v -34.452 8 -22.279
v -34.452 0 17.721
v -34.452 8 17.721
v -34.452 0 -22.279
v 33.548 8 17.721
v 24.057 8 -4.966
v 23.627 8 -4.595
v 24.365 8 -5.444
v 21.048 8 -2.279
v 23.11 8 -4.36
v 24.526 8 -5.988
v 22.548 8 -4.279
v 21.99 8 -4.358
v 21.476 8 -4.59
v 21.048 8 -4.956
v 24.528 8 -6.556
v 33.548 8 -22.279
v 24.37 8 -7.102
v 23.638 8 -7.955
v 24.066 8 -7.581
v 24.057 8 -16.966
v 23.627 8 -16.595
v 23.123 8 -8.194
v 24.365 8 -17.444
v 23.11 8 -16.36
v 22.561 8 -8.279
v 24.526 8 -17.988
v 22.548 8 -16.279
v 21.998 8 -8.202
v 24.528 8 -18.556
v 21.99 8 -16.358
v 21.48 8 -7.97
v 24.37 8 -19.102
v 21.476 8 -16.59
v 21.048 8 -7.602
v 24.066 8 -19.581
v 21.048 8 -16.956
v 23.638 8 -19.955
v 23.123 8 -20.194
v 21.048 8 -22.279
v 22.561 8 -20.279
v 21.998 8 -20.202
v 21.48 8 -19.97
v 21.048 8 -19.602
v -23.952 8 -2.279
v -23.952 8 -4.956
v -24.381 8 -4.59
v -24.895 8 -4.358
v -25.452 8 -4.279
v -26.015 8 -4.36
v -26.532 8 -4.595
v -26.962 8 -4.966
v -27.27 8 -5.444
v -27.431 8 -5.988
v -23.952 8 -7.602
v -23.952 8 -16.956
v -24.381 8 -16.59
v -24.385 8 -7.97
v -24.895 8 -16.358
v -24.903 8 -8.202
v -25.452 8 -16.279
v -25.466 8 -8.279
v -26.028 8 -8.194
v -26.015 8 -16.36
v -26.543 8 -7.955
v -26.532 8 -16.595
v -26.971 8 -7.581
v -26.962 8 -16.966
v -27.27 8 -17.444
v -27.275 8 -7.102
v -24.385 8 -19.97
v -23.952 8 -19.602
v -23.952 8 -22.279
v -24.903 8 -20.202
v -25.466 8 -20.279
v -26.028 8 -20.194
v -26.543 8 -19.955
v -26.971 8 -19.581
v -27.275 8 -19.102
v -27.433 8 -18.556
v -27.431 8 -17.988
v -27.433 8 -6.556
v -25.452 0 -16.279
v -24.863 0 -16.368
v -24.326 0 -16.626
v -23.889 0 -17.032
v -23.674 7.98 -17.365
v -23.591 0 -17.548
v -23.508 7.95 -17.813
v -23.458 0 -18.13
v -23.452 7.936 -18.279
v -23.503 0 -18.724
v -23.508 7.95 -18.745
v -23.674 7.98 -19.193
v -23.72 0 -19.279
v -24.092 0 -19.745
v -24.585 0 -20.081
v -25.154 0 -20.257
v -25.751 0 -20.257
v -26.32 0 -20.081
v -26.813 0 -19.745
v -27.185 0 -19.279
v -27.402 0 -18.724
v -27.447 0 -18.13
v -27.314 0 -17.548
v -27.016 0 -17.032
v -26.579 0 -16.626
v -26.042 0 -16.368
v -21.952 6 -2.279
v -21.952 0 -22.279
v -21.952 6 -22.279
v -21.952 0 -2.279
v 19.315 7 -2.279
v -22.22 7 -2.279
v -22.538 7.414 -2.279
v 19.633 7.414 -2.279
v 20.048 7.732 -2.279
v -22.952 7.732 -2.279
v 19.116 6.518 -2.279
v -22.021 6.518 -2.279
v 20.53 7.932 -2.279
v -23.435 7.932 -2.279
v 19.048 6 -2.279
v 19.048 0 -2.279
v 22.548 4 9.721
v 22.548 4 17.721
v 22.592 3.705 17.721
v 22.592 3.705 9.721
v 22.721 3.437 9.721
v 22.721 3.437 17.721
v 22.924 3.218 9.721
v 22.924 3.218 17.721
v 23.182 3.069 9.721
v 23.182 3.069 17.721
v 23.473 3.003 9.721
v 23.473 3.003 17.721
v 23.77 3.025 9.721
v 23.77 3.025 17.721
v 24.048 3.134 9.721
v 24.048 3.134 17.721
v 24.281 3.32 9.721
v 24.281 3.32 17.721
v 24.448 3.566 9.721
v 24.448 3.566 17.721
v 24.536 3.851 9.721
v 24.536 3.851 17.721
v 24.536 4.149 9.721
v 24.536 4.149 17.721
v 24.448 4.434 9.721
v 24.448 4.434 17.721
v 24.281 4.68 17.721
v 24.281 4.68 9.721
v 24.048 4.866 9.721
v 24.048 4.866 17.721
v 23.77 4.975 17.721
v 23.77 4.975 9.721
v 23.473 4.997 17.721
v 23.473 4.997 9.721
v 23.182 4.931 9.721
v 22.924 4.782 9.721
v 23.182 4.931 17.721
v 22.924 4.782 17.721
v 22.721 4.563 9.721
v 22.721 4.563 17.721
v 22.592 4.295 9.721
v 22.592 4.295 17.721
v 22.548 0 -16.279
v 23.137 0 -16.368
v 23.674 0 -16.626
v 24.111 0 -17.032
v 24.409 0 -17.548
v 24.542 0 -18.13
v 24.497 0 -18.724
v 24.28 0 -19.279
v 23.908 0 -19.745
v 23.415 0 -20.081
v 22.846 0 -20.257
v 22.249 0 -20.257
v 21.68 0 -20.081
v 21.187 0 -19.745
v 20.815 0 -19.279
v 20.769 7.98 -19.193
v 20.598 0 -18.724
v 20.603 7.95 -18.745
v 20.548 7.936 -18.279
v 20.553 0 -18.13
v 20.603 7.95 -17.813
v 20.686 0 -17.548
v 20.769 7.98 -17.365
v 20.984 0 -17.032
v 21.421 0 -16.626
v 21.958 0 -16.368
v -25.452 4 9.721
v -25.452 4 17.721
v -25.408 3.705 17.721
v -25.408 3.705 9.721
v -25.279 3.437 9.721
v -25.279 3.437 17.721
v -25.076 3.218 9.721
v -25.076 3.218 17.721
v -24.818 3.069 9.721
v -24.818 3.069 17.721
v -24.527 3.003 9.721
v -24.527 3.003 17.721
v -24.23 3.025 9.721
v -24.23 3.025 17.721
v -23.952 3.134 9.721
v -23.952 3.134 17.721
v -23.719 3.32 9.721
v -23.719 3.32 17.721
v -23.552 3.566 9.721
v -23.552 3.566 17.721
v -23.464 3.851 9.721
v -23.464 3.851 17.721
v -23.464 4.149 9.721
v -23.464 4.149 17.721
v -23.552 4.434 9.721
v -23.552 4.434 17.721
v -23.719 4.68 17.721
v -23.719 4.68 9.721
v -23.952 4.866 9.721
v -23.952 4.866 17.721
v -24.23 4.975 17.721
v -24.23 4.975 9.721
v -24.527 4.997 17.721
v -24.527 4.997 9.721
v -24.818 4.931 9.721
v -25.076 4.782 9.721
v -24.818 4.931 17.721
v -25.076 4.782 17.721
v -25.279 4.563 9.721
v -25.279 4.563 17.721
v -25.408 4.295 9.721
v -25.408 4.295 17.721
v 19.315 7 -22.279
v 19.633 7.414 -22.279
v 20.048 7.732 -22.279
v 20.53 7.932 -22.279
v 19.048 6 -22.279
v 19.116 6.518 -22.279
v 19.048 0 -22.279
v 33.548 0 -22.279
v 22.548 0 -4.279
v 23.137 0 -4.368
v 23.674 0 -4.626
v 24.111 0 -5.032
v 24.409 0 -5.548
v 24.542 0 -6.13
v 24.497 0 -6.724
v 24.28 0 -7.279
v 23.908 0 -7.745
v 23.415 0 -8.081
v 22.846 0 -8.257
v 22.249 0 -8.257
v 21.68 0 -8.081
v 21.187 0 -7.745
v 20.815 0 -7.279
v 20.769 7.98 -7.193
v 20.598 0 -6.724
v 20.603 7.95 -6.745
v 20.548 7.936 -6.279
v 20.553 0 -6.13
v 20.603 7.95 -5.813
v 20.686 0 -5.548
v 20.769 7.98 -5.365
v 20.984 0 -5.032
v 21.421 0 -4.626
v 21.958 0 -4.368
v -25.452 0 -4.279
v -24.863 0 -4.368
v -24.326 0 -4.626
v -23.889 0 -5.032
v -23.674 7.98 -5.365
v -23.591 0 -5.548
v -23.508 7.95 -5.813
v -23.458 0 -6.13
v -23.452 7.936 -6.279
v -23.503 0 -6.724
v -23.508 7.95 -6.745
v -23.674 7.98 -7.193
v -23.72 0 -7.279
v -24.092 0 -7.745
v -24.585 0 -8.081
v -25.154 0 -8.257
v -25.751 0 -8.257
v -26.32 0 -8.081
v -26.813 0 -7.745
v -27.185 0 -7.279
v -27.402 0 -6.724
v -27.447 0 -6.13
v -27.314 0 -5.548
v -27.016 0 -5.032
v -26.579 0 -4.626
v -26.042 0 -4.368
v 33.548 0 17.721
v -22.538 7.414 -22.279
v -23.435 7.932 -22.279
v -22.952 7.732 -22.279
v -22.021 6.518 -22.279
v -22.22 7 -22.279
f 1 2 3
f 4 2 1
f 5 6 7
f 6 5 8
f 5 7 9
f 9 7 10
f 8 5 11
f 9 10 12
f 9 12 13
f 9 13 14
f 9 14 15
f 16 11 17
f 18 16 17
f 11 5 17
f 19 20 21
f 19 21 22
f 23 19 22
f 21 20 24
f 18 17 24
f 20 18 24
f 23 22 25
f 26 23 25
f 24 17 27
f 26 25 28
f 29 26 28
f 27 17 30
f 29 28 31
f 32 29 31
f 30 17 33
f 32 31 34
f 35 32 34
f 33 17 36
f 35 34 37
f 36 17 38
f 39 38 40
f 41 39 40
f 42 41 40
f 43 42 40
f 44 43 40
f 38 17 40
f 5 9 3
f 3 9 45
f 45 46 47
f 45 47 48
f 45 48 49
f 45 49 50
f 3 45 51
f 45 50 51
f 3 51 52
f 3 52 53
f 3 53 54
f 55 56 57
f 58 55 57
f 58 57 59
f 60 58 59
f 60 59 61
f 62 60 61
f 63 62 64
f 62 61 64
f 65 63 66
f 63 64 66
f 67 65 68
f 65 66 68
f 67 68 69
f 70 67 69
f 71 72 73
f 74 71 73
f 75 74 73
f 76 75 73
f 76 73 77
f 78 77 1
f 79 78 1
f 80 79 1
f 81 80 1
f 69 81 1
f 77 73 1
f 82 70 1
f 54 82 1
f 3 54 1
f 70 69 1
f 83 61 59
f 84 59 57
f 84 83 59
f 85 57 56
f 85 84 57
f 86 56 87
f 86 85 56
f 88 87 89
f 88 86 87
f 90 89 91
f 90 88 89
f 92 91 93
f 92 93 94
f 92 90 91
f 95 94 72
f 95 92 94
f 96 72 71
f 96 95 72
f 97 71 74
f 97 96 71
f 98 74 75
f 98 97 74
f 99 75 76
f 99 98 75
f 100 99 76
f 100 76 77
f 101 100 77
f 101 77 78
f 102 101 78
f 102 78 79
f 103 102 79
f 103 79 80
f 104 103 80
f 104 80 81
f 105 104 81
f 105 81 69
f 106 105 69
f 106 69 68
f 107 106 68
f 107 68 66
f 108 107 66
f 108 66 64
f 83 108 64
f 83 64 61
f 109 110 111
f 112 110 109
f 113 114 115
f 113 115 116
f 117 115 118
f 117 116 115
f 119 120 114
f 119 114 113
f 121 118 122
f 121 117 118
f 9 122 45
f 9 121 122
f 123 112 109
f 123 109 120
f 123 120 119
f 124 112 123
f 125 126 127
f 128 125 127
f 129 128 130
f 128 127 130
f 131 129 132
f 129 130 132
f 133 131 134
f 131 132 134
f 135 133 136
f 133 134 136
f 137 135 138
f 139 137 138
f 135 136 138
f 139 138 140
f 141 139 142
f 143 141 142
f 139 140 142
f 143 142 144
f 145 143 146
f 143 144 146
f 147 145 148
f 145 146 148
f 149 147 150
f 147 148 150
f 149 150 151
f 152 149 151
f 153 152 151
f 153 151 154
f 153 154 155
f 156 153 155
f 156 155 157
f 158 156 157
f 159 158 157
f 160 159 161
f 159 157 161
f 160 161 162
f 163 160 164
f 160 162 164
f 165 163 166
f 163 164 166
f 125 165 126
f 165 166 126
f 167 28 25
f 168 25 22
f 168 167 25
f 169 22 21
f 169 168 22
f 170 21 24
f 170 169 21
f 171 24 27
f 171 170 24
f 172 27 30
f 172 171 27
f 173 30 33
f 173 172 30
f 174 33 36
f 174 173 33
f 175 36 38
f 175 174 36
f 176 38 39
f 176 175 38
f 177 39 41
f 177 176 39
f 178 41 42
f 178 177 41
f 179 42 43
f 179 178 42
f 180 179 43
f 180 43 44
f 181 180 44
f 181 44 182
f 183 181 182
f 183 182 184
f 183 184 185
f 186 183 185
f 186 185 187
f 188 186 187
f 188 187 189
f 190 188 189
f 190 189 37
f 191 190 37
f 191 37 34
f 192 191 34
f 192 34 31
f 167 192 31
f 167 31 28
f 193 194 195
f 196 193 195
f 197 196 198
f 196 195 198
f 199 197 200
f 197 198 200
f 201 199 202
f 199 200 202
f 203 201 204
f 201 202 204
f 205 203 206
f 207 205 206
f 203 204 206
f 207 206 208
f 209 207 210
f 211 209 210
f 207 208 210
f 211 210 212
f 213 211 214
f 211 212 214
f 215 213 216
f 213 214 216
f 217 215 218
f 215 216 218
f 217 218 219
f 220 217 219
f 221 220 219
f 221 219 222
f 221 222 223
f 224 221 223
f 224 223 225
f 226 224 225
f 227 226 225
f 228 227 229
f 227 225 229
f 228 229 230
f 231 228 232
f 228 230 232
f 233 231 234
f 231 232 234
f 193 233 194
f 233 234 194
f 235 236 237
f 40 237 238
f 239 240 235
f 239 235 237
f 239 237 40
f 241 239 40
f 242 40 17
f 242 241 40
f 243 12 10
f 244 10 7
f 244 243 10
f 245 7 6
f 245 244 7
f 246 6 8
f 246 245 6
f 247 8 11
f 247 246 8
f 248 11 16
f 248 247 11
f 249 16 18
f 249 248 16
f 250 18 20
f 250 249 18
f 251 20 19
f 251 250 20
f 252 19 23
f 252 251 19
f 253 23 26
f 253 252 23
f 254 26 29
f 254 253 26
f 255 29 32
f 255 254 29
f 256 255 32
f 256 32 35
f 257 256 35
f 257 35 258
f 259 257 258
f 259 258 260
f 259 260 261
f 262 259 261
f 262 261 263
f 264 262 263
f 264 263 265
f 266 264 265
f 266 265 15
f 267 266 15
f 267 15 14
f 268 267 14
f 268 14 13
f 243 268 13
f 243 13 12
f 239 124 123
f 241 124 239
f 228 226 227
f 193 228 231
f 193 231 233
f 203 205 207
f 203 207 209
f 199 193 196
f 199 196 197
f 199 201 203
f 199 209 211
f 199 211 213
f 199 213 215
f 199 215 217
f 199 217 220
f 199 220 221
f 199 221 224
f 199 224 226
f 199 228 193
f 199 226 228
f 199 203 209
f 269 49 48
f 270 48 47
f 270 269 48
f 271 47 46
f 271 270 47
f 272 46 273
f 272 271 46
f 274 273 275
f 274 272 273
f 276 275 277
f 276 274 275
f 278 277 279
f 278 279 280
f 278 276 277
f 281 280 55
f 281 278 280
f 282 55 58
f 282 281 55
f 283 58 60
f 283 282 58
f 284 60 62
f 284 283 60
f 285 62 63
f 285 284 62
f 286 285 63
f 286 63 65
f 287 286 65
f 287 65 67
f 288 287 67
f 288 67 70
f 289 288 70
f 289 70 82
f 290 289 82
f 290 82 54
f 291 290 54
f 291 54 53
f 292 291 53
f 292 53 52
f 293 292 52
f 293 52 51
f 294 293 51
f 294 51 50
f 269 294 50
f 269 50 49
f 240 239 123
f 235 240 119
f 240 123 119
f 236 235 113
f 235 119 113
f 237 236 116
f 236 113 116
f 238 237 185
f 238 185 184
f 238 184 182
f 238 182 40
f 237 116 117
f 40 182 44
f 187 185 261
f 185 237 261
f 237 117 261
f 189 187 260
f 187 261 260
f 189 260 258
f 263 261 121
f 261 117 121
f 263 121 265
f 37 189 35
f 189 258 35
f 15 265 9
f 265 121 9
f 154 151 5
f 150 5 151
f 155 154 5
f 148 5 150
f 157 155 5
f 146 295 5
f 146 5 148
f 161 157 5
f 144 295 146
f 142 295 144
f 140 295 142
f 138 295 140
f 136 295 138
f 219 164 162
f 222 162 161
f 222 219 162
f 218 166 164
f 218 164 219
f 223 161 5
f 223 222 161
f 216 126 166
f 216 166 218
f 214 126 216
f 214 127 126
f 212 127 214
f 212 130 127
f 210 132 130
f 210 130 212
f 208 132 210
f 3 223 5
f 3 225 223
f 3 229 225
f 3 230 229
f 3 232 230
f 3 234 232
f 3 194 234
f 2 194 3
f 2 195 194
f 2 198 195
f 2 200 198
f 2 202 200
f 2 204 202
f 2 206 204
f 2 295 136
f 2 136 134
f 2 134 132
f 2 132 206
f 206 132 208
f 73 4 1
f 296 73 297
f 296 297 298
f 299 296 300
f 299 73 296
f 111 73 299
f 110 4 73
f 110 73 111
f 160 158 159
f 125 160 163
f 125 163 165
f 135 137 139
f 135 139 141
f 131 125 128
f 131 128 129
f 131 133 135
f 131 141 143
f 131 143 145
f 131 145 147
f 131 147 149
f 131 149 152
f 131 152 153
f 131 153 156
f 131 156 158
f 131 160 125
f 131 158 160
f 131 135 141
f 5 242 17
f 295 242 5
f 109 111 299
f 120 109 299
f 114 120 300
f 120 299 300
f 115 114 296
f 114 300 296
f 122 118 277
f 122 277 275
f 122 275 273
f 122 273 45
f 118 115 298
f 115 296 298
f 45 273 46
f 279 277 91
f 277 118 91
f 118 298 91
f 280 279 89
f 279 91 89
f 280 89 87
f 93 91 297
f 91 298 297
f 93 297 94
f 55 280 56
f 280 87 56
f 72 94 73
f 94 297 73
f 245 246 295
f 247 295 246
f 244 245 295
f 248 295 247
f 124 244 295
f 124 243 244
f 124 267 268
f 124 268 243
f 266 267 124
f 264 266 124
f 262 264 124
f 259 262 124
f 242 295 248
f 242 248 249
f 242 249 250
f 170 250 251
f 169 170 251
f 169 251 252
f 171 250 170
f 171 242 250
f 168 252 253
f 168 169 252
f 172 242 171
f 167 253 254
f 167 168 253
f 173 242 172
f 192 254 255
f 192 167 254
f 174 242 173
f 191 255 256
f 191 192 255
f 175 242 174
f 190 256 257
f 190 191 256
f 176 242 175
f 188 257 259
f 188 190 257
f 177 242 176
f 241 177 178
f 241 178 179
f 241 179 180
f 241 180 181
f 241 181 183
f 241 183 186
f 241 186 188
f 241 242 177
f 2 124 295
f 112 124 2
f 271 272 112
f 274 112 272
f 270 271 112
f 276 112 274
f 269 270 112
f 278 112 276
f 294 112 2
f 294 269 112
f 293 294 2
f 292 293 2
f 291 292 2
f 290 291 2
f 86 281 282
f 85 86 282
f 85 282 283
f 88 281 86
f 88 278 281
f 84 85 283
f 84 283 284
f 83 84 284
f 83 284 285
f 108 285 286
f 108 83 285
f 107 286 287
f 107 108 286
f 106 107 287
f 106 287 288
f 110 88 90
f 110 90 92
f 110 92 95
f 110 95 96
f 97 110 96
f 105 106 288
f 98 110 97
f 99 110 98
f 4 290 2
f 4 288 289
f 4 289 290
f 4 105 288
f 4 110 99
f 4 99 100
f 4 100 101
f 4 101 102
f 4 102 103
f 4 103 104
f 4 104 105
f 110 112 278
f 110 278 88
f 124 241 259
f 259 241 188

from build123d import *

# Parameters (mm, degrees)
SKETCH1_R           = 2
BOSS_EXTRUDE1_DEPTH = 8
CUT_EXTRUDE1_START  = 17.721034
SKETCH2_R           = 1
CUT_EXTRUDE1_DEPTH  = 8
FILLET1_R           = 2


with BuildPart() as part:
    # Sketch1 → Boss-Extrude1 (new body)
    with BuildSketch(Plane(origin=(0, 0, 0), x_dir=(1, 0, 0), z_dir=(0, 1, 0))):
        Polygon((19.047511312, 22.278966214), (33.547511312, 22.278966214), (33.547511312, -17.721033786), (-34.452488688, -17.721033786), (-34.452488688, 22.278966214), (-21.952488688, 22.278966214), (-21.952488688, 2.278966214), (19.047511312, 2.278966214), align=None)
        with Locations(Location((-25.452488688, 18.278966214, 0), (0, 0, 270))):
            Circle(SKETCH1_R, mode=Mode.SUBTRACT)
        with Locations(Location((-25.452488688, 6.278966214, 0), (0, 0, 270))):
            Circle(SKETCH1_R, mode=Mode.SUBTRACT)
        with Locations(Location((22.547511312, 18.278966214, 0), (0, 0, 270))):
            Circle(SKETCH1_R, mode=Mode.SUBTRACT)
        with Locations(Location((22.547511312, 6.278966214, 0), (0, 0, 270))):
            Circle(SKETCH1_R, mode=Mode.SUBTRACT)
    extrude(amount=BOSS_EXTRUDE1_DEPTH)

    # Sketch2 → Cut-Extrude1 (cut)
    with BuildSketch(Plane.XY.offset(CUT_EXTRUDE1_START)):
        with Locations(Location((-24.452488688, 4, 0), (0, 0, 180))):
            Circle(SKETCH2_R)
        with Locations(Location((23.547511312, 4, 0), (0, 0, 180))):
            Circle(SKETCH2_R)
    extrude(amount=-CUT_EXTRUDE1_DEPTH, mode=Mode.SUBTRACT)

    # Fillet1
    # the kernel refuses this fillet: 2 mm, written as the material it takes off along each edge
    with BuildSketch(Plane(origin=(19.047511312, 8, -2.278966214), x_dir=(0, -1, 0), z_dir=(0, 0, -1))) as fillet1_piece_1:
        with BuildLine():
            CenterArc((FILLET1_R, -FILLET1_R), FILLET1_R, 90, 90)
            Line((0, -FILLET1_R), (0, 0))
            Line((0, 0), (FILLET1_R, 0))
        make_face()
    extrude(amount=25, mode=Mode.SUBTRACT)
    with BuildSketch(Plane(origin=(-21.952488688, 8, -27.278966214), x_dir=(-1, 0, 0), z_dir=(0, 0, 1))) as fillet1_piece_2:
        with BuildLine():
            CenterArc((FILLET1_R, FILLET1_R), FILLET1_R, 180, 90)
            Line((0, FILLET1_R), (0, 0))
            Line((0, 0), (FILLET1_R, 0))
        make_face()
    extrude(amount=25, mode=Mode.SUBTRACT)


solid = part.part
